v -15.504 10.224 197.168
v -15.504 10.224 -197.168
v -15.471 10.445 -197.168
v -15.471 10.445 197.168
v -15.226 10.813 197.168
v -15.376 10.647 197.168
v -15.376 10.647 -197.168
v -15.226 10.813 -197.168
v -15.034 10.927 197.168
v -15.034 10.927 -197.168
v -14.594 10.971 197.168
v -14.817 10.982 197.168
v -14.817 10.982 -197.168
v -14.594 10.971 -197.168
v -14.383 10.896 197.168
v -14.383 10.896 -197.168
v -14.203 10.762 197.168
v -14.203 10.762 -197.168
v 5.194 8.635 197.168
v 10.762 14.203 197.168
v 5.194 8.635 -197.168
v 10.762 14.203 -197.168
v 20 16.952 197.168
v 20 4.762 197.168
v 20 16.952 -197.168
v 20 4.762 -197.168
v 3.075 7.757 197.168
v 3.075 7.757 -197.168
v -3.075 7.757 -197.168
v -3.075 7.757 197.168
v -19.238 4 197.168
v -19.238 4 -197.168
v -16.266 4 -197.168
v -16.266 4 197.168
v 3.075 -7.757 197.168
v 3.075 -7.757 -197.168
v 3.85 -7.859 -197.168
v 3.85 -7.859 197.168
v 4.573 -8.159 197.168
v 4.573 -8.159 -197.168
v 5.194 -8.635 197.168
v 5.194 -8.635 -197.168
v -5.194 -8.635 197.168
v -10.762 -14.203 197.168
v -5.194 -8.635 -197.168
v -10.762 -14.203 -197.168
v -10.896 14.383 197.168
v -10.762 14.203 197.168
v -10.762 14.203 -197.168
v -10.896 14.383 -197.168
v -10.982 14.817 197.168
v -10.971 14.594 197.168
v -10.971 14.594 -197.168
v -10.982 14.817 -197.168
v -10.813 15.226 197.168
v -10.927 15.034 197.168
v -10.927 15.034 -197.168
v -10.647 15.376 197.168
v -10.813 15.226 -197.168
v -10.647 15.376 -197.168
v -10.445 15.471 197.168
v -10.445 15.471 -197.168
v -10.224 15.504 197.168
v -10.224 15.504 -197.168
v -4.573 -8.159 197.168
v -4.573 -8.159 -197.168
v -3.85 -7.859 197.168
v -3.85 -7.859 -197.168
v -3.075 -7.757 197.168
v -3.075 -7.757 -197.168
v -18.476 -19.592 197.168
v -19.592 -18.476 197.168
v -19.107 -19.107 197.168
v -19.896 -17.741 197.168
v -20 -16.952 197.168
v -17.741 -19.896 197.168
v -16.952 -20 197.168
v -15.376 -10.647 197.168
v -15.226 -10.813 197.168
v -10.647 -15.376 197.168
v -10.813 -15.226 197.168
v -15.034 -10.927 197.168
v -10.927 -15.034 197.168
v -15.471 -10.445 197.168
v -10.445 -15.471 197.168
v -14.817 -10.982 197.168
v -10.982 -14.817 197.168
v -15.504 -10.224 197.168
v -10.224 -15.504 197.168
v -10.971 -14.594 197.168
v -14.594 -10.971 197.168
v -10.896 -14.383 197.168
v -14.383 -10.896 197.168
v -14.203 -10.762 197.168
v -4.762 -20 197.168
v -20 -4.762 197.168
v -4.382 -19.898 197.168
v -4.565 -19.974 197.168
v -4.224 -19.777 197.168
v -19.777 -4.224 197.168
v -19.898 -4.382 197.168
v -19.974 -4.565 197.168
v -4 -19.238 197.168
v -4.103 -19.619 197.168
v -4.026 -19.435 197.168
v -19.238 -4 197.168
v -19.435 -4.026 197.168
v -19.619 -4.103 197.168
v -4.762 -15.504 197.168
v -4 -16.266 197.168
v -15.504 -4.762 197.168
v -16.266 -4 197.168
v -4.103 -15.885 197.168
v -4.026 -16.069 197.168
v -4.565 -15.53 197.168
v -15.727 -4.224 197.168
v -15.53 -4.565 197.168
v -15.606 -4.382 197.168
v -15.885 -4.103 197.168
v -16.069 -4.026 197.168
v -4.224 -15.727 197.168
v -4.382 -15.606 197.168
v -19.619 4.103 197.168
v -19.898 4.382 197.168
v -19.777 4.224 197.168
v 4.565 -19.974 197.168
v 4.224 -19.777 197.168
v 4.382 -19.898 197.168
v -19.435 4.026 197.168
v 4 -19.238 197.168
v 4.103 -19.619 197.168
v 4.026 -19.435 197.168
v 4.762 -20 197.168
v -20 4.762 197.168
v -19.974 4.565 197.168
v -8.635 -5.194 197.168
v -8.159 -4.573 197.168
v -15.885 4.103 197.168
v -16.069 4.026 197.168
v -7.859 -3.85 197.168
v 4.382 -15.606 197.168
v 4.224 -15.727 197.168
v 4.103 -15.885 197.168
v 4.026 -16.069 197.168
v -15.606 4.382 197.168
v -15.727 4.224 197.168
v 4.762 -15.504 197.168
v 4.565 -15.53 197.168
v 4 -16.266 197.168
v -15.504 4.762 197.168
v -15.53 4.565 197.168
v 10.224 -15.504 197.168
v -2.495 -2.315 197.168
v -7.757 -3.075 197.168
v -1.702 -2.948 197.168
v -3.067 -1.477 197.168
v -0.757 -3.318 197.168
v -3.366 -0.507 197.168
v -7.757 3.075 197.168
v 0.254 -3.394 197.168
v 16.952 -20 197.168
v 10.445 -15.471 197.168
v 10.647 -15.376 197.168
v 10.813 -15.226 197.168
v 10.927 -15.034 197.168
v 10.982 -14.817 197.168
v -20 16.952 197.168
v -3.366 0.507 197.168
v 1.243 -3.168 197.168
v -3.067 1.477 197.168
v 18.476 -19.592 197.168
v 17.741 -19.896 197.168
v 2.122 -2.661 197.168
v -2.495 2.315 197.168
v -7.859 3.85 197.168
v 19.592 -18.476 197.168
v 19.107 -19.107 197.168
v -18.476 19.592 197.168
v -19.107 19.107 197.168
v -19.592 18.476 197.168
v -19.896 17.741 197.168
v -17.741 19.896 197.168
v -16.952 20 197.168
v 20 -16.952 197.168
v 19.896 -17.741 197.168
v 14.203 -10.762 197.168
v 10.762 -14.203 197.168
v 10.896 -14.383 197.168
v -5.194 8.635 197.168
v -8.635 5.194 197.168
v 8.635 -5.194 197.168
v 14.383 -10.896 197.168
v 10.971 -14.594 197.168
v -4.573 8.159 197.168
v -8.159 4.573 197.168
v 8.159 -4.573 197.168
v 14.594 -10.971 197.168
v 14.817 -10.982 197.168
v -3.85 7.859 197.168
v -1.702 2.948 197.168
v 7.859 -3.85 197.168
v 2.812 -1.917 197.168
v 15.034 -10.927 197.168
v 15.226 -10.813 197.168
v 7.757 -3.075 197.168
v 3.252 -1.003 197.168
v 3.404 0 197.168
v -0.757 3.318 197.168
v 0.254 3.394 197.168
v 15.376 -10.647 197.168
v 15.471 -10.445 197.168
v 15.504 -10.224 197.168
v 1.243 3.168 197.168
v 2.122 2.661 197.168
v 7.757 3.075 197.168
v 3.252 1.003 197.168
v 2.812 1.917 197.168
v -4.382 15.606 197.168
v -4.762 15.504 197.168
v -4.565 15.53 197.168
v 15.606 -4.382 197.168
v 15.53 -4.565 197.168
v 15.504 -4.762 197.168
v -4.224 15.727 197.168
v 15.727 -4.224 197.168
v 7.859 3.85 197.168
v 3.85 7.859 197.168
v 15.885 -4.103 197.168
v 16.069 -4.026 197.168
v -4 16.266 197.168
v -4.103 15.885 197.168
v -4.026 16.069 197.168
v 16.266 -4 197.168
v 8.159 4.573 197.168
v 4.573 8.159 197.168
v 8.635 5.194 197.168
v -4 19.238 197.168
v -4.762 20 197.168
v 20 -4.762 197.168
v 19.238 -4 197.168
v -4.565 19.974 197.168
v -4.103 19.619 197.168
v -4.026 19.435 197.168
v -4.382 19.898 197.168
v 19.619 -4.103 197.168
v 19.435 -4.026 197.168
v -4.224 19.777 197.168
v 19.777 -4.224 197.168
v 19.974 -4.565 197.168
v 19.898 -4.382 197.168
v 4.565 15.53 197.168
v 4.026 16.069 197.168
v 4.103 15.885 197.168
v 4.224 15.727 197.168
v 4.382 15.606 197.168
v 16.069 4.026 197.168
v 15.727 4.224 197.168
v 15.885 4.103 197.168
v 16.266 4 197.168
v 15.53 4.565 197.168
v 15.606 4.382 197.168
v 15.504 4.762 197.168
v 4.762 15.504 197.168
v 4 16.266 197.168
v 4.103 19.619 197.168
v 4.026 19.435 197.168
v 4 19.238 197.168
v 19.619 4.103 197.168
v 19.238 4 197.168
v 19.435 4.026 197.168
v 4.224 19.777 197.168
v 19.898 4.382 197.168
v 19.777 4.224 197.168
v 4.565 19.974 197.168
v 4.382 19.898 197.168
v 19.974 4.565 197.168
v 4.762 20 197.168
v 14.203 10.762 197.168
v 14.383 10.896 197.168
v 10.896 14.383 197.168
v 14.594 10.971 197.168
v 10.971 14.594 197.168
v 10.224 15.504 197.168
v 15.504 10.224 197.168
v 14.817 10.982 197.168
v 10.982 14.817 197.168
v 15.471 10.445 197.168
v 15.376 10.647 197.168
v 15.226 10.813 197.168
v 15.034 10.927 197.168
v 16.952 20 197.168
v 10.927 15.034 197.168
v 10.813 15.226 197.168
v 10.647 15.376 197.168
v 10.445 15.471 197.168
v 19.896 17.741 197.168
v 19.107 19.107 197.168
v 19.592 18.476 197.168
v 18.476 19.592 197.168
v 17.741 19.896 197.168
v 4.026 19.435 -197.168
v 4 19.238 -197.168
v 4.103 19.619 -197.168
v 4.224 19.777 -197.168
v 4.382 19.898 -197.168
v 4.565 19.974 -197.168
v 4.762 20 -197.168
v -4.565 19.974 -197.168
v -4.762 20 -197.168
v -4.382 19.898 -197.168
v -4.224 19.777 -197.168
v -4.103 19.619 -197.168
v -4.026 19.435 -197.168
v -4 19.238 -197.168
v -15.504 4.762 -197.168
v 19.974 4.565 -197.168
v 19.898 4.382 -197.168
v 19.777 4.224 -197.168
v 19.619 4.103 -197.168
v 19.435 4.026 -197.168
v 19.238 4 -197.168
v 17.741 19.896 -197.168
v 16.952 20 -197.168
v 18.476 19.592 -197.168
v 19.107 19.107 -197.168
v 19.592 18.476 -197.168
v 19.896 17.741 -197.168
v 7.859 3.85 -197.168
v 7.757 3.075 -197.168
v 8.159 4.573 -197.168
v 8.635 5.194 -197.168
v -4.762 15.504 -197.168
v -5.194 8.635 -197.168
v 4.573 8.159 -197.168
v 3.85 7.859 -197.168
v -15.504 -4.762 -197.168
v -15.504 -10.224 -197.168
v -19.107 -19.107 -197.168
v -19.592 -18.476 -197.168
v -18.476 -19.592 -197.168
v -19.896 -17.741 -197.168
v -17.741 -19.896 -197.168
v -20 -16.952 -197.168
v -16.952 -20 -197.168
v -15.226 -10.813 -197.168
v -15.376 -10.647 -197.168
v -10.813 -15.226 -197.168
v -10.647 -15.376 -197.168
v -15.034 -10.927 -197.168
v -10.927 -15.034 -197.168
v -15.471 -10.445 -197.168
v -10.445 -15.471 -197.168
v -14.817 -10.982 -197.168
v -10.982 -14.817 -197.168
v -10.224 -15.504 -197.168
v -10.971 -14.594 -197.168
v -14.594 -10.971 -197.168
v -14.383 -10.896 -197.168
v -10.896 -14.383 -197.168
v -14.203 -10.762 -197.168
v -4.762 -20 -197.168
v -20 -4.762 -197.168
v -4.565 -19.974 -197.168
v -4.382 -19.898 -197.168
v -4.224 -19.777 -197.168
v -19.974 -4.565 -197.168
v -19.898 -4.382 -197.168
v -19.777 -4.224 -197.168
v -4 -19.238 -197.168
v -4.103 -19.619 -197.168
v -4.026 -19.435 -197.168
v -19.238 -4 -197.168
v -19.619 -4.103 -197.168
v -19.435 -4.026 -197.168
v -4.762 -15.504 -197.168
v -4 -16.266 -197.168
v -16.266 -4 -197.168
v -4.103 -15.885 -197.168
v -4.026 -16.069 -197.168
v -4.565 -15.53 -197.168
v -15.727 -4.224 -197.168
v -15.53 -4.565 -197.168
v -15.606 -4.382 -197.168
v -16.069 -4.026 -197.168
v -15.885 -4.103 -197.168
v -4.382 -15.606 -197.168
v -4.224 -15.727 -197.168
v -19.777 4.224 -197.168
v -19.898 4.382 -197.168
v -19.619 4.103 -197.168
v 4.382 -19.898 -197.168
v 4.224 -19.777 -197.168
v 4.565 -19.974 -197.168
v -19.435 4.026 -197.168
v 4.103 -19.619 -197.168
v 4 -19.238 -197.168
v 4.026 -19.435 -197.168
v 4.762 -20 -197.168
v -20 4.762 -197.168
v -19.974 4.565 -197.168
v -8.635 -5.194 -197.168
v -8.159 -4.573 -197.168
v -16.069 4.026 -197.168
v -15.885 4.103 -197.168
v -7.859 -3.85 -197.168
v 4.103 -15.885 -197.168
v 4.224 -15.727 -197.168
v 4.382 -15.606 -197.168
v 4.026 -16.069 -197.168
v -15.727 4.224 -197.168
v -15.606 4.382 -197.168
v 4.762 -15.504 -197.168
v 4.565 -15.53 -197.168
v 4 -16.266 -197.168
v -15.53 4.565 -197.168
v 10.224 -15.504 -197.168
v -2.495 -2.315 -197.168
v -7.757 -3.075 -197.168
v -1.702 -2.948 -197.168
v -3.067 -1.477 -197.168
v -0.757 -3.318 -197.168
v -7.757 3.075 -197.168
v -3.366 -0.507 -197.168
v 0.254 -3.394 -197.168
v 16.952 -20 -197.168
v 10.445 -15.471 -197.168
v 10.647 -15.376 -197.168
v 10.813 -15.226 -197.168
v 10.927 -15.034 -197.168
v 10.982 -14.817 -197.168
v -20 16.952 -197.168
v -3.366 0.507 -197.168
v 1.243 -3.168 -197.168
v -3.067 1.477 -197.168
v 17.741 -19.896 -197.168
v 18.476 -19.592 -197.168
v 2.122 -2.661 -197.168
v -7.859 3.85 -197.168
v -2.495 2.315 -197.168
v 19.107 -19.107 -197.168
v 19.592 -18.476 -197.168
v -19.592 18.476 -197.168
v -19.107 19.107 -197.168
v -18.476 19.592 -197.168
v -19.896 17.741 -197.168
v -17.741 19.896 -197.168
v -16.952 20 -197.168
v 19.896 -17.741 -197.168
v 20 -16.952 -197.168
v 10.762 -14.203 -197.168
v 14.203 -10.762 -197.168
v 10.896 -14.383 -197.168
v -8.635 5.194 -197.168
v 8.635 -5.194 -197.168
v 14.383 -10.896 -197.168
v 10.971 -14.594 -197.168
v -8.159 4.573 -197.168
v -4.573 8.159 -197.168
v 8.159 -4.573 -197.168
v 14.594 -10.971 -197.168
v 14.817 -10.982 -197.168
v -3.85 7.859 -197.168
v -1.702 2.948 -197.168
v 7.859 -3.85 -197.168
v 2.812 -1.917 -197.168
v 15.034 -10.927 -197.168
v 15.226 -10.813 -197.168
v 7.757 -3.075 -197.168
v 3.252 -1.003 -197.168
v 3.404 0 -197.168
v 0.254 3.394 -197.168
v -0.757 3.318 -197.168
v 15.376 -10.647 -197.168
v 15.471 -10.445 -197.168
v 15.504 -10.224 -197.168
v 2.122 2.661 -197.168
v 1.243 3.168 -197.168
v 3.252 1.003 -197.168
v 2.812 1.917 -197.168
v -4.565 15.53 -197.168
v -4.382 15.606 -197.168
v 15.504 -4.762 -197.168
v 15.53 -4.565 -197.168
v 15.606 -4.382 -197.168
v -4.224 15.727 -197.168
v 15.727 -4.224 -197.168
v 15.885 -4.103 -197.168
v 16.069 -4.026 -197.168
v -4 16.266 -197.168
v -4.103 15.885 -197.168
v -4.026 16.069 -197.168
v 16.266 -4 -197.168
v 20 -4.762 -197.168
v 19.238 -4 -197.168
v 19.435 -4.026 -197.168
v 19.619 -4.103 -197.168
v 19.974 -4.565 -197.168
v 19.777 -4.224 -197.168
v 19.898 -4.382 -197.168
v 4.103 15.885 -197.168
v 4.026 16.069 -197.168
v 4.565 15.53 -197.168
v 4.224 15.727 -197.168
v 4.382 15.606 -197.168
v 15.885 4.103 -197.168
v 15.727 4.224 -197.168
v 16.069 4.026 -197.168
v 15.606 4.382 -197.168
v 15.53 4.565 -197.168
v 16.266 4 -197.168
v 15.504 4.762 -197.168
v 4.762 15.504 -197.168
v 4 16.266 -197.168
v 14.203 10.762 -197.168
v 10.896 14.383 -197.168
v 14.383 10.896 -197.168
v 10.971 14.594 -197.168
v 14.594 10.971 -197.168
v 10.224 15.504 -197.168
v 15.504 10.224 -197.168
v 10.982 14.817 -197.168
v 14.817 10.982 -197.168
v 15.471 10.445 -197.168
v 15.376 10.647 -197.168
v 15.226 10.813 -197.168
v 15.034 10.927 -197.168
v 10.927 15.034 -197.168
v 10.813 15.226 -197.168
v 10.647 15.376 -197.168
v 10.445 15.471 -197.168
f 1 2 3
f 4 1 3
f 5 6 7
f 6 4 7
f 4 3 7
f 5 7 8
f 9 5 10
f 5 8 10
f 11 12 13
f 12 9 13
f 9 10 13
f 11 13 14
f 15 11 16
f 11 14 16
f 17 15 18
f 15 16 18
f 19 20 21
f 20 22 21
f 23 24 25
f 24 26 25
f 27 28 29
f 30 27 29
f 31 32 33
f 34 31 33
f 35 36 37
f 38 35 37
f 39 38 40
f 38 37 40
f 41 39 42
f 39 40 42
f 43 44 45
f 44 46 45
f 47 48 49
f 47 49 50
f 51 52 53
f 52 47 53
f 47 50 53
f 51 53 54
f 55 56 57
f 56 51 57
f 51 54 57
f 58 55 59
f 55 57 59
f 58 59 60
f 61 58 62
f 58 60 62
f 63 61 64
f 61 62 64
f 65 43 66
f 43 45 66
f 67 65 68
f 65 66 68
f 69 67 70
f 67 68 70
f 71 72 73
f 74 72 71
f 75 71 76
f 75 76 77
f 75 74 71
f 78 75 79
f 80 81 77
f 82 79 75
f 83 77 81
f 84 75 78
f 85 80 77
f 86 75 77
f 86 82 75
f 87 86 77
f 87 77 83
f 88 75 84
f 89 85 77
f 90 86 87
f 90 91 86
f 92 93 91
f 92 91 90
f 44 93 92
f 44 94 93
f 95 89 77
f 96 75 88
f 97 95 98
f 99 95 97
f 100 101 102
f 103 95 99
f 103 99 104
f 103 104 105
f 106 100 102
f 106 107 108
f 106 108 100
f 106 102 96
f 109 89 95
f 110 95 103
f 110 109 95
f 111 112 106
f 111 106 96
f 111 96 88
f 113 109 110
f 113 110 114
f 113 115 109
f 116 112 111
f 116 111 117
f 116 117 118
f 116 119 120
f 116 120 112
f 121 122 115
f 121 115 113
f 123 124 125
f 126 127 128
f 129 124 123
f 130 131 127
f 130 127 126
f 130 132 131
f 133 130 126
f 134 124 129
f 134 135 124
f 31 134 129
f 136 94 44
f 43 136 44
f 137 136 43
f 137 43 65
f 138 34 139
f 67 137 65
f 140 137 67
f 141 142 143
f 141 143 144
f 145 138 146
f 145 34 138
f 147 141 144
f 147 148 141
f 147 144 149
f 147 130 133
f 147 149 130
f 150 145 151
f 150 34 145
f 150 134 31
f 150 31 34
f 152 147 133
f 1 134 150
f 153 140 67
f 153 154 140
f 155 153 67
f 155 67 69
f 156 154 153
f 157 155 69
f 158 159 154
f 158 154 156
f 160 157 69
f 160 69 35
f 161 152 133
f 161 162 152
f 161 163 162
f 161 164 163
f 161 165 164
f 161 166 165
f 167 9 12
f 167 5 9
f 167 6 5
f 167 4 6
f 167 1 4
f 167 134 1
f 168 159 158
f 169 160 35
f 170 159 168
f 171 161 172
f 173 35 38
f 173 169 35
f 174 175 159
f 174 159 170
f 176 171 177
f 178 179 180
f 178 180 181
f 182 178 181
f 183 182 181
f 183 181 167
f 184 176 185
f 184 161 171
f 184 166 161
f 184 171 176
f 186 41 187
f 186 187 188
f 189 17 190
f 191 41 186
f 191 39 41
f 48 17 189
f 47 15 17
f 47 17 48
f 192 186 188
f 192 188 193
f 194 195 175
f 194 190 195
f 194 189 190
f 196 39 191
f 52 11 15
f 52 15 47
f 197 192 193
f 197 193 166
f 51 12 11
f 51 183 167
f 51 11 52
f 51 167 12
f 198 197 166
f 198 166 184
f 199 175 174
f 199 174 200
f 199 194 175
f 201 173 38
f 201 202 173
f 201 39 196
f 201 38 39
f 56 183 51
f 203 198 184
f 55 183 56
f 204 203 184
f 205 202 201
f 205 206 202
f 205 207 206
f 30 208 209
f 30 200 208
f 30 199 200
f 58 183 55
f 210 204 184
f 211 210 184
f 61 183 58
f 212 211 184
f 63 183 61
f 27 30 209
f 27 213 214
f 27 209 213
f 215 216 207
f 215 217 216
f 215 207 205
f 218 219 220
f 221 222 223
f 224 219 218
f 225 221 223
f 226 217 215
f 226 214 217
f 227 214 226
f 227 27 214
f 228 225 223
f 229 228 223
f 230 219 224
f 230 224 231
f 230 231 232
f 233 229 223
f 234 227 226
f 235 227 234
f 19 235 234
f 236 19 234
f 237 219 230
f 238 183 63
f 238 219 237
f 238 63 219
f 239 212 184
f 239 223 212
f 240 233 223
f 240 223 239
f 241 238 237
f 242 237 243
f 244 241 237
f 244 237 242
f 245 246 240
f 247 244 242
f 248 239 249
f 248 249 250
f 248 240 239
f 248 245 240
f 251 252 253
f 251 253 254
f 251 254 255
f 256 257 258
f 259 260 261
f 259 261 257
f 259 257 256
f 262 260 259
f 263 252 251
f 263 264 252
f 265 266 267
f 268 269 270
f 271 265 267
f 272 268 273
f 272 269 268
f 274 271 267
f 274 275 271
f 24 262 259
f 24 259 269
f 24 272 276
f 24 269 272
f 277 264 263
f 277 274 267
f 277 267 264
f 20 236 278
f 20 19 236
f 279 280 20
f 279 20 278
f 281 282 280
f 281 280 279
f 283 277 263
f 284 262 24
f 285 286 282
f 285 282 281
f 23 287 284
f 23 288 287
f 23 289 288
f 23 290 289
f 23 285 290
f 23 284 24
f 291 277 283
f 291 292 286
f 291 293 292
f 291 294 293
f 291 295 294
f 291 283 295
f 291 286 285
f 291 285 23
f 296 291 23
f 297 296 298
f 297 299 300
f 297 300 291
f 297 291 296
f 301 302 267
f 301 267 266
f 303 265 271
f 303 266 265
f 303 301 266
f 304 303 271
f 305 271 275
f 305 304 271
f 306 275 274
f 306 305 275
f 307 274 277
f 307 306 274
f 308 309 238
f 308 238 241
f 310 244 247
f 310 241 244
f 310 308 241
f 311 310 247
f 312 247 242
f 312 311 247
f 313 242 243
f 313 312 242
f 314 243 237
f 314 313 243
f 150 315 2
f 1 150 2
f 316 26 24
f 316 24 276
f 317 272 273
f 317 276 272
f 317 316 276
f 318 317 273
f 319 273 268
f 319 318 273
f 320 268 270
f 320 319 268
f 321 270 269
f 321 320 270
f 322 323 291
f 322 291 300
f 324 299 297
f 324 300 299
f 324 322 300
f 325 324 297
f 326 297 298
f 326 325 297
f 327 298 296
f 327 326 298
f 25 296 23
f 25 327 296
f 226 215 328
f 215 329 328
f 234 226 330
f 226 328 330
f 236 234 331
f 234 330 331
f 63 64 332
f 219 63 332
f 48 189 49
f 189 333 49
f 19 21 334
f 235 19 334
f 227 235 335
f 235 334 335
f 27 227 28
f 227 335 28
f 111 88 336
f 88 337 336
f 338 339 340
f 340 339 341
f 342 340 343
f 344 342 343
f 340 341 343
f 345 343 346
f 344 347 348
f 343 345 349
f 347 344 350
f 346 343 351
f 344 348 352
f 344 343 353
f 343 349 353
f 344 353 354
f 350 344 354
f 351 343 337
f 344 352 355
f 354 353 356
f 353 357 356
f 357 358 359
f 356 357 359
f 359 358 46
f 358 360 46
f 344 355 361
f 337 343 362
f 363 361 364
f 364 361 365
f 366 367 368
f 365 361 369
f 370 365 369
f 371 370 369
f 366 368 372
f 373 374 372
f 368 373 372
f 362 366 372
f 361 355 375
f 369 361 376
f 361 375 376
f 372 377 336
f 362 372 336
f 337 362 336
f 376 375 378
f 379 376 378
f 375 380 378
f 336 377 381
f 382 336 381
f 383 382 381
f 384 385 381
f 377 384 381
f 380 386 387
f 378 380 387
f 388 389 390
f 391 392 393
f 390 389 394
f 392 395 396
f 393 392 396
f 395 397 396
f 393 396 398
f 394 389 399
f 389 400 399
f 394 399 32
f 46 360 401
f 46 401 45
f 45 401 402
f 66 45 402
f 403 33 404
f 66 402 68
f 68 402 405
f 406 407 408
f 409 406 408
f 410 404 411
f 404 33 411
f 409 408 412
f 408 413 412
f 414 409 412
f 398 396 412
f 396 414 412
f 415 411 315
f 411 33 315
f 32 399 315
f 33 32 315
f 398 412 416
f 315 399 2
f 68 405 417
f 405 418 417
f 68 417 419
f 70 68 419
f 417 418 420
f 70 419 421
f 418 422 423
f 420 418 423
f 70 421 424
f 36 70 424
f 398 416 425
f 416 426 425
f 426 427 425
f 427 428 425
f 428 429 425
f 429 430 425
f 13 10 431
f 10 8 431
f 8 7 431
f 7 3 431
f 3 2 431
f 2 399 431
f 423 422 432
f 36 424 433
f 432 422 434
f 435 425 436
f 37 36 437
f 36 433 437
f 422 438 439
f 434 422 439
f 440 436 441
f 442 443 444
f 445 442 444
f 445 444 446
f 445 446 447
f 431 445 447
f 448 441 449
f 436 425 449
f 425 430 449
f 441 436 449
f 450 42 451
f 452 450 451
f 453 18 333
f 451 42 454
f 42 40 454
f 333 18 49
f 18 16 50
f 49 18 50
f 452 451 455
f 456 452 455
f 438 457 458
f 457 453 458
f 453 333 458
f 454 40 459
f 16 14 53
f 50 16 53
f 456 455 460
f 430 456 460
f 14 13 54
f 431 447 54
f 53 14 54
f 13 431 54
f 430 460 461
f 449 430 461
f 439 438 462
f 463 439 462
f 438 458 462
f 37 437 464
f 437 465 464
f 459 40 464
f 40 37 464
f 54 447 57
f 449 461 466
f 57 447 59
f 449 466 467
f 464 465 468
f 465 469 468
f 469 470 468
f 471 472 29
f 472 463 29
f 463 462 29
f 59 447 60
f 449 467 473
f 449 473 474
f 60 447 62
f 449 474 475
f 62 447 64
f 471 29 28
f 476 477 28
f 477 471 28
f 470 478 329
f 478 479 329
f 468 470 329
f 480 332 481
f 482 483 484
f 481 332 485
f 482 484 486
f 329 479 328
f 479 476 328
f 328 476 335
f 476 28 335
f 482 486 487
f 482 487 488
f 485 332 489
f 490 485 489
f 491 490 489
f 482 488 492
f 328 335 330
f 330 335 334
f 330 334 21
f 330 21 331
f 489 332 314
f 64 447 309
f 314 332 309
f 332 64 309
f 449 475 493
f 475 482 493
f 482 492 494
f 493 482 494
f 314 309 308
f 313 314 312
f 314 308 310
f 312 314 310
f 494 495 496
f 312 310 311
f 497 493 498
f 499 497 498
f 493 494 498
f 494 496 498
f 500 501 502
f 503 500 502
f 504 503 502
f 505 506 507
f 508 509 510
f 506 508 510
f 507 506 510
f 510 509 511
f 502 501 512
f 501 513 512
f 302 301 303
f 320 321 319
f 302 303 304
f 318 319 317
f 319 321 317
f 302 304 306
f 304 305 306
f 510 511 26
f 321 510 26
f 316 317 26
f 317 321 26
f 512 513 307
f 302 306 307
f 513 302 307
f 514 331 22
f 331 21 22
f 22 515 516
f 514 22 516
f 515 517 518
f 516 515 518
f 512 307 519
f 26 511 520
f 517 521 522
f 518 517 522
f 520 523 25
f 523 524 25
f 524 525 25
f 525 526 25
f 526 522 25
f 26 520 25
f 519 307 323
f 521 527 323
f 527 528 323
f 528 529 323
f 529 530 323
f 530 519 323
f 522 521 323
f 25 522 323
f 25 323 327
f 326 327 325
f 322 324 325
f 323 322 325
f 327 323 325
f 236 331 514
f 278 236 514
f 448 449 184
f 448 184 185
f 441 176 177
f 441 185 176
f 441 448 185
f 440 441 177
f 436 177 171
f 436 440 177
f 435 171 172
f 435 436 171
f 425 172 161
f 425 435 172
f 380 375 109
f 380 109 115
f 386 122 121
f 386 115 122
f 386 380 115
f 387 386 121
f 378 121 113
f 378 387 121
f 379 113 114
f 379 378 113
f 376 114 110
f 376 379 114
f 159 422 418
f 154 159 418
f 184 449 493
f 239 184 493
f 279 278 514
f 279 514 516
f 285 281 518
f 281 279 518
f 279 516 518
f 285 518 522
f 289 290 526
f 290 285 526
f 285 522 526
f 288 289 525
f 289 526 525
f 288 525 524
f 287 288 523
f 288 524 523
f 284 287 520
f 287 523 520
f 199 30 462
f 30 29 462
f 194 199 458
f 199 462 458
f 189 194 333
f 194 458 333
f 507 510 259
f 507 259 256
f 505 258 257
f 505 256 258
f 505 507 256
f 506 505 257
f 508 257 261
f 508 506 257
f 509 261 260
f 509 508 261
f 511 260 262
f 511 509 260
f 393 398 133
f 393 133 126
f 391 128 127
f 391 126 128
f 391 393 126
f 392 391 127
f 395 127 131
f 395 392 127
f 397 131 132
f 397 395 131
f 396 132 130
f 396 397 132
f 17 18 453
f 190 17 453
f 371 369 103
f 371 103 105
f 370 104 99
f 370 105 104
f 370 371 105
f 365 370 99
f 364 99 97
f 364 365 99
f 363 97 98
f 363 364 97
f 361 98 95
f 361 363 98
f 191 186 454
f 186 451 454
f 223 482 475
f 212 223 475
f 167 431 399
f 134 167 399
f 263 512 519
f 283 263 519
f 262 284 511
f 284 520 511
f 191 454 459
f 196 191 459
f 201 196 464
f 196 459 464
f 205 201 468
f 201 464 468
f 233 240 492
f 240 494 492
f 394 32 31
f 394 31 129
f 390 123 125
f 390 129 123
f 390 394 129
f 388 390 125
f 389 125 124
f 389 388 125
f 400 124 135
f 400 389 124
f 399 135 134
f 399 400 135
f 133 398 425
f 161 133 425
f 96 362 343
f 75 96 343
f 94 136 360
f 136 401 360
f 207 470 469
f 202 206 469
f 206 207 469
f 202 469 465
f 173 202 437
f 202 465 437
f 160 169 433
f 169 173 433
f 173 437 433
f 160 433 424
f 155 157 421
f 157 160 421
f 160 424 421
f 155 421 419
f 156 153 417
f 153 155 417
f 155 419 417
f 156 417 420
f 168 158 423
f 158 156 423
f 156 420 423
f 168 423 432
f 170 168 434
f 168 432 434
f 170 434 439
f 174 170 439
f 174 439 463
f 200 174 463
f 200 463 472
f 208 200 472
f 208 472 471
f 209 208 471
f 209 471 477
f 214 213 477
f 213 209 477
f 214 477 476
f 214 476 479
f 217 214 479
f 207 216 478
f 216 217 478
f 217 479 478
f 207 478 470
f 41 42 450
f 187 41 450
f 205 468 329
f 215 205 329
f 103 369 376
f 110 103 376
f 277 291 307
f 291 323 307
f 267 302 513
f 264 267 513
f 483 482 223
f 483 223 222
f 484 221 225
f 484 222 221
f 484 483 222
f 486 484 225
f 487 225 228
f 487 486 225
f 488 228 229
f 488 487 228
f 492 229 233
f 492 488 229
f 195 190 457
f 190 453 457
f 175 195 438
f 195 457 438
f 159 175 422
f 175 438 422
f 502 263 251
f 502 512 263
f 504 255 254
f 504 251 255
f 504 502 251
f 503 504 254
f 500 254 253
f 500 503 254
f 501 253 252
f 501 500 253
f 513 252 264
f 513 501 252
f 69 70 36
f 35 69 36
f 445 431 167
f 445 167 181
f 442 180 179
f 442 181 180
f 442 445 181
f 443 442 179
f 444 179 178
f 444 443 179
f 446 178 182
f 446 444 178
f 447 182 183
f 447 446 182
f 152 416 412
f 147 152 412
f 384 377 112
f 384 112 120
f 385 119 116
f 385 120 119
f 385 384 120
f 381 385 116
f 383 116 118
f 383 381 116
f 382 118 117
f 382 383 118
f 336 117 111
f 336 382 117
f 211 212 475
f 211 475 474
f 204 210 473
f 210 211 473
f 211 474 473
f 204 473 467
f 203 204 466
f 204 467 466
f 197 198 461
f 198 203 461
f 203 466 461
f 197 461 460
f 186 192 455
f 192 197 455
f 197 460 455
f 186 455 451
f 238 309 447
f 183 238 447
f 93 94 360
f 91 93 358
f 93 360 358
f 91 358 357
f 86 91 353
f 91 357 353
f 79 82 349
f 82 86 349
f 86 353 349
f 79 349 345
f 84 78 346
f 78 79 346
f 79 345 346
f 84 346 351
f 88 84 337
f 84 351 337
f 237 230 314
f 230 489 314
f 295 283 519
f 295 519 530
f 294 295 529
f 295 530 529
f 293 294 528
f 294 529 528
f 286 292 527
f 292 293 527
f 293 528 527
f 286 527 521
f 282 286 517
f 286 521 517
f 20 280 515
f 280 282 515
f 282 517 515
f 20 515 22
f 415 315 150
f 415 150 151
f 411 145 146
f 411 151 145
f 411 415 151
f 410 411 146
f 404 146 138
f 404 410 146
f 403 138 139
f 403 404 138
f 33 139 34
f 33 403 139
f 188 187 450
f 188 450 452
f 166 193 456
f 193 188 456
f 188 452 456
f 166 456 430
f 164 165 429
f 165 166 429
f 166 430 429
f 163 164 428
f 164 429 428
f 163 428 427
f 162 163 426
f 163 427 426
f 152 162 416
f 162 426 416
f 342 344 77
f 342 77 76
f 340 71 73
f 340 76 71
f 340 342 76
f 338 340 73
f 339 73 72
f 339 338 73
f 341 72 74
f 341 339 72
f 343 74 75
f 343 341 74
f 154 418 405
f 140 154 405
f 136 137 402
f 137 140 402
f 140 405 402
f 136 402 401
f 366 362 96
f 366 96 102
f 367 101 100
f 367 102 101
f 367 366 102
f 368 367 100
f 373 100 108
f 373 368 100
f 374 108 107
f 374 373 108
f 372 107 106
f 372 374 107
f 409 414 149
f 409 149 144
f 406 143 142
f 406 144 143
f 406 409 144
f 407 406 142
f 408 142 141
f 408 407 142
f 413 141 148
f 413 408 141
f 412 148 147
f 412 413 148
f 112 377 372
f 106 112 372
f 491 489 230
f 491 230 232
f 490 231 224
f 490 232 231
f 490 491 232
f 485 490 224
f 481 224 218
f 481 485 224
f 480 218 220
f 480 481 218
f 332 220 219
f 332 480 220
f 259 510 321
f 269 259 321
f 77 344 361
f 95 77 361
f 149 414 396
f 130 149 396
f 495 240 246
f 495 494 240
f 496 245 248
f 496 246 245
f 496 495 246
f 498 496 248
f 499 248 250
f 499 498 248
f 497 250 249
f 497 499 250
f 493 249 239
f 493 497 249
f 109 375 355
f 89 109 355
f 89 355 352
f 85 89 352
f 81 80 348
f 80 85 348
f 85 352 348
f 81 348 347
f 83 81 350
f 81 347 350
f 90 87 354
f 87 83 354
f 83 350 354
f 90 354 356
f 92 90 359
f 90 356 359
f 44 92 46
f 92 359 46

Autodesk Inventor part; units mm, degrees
ref_plane "YZ Plane" through (0, 0, 0) normal (1, 0, 0) x (0, 1, 0)
ref_plane "XZ Plane" through (0, 0, 0) normal (0, 1, 0) x (-1, 0, 0)
ref_plane "XY Plane" through (0, 0, 0) normal (0, 0, 1) x (1, 0, 0)
sketch "Sketch1" plane through (-16.952, 20, 0) normal (0, 0, 1) x (1, 0, 0)
  arc A0 (11.758, -11.3649) -> (13.8774, -12.2428) centre (13.8774, -9.2456) ccw projected
  line L0 (11.758, -11.3649) -> (6.1897, -5.7966) projected
  arc A1 (6.7285, -4.4958) -> (6.1897, -5.7966) centre (6.7285, -5.2578) ccw projected
  line L1 (6.7285, -4.4958) -> (12.1895, -4.4958) projected
  arc A2 (12.1895, -4.4958) -> (12.9515, -3.7338) centre (12.1895, -3.7338) ccw projected
  line L2 (12.9515, -3.7338) -> (12.9515, -0.762) projected
  arc A3 (12.9515, -0.762) -> (12.1895, 0) centre (12.1895, -0.762) ccw projected
  line L3 (12.1895, 0) -> (0, 0) projected
  arc A4 (0, 0) -> (-3.048, -3.048) centre (0, -3.048) ccw projected
  line L4 (-3.048, -3.048) -> (-3.048, -15.2375) projected
  arc A5 (-3.048, -15.2375) -> (-2.286, -15.9995) centre (-2.286, -15.2375) ccw projected
  line L5 (-2.286, -15.9995) -> (0.6858, -15.9995) projected
  arc A6 (0.6858, -15.9995) -> (1.4478, -15.2375) centre (0.6858, -15.2375) ccw projected
  line L6 (1.4478, -15.2375) -> (1.4478, -9.7765) projected
  arc A7 (2.7486, -9.2377) -> (1.4478, -9.7765) centre (2.2098, -9.7765) ccw projected
  line L7 (2.7486, -9.2377) -> (8.3169, -14.806) projected
  arc A8 (9.1948, -16.9254) -> (8.3169, -14.806) centre (6.1976, -16.9254) ccw projected
  line L8 (9.1948, -16.9254) -> (9.1948, -23.0746) projected
  arc A9 (8.3169, -25.194) -> (9.1948, -23.0746) centre (6.1976, -23.0746) ccw projected
  line L9 (8.3169, -25.194) -> (2.7486, -30.7623) projected
  arc A10 (1.4478, -30.2235) -> (2.7486, -30.7623) centre (2.2098, -30.2235) ccw projected
  line L10 (1.4478, -30.2235) -> (1.4478, -24.7625) projected
  arc A11 (1.4478, -24.7625) -> (0.6858, -24.0005) centre (0.6858, -24.7625) ccw projected
  line L11 (0.6858, -24.0005) -> (-2.286, -24.0005) projected
  arc A12 (-2.286, -24.0005) -> (-3.048, -24.7625) centre (-2.286, -24.7625) ccw projected
  line L12 (-3.048, -24.7625) -> (-3.048, -36.952) projected
  arc A13 (-3.048, -36.952) -> (0, -40) centre (0, -36.952) ccw projected
  line L13 (0, -40) -> (12.1895, -40) projected
  arc A14 (12.1895, -40) -> (12.9515, -39.238) centre (12.1895, -39.238) ccw projected
  line L14 (12.9515, -39.238) -> (12.9515, -36.2662) projected
  arc A15 (12.9515, -36.2662) -> (12.1895, -35.5042) centre (12.1895, -36.2662) ccw projected
  line L15 (12.1895, -35.5042) -> (6.7285, -35.5042) projected
  arc A16 (6.1897, -34.2034) -> (6.7285, -35.5042) centre (6.7285, -34.7422) ccw projected
  line L16 (6.1897, -34.2034) -> (11.758, -28.6351) projected
  arc A17 (13.8774, -27.7572) -> (11.758, -28.6351) centre (13.8774, -30.7544) ccw projected
  line L17 (13.8774, -27.7572) -> (20.0266, -27.7572) projected
  arc A18 (22.146, -28.6351) -> (20.0266, -27.7572) centre (20.0266, -30.7544) ccw projected
  line L18 (22.146, -28.6351) -> (27.7143, -34.2034) projected
  arc A19 (27.1755, -35.5042) -> (27.7143, -34.2034) centre (27.1755, -34.7422) ccw projected
  line L19 (27.1755, -35.5042) -> (21.7145, -35.5042) projected
  arc A20 (21.7145, -35.5042) -> (20.9525, -36.2662) centre (21.7145, -36.2662) ccw projected
  line L20 (20.9525, -36.2662) -> (20.9525, -39.238) projected
  arc A21 (20.9525, -39.238) -> (21.7145, -40) centre (21.7145, -39.238) ccw projected
  line L21 (21.7145, -40) -> (33.904, -40) projected
  arc A22 (33.904, -40) -> (36.952, -36.952) centre (33.904, -36.952) ccw projected
  line L22 (36.952, -36.952) -> (36.952, -24.7625) projected
  arc A23 (36.952, -24.7625) -> (36.19, -24.0005) centre (36.19, -24.7625) ccw projected
  line L23 (36.19, -24.0005) -> (33.2182, -24.0005) projected
  arc A24 (33.2182, -24.0005) -> (32.4562, -24.7625) centre (33.2182, -24.7625) ccw projected
  line L24 (32.4562, -24.7625) -> (32.4562, -30.2235) projected
  arc A25 (31.1554, -30.7623) -> (32.4562, -30.2235) centre (31.6942, -30.2235) ccw projected
  line L25 (31.1554, -30.7623) -> (25.5871, -25.194) projected
  arc A26 (24.7092, -23.0746) -> (25.5871, -25.194) centre (27.7064, -23.0746) ccw projected
  line L26 (24.7092, -23.0746) -> (24.7092, -16.9254) projected
  arc A27 (25.5871, -14.806) -> (24.7092, -16.9254) centre (27.7064, -16.9254) ccw projected
  line L27 (25.5871, -14.806) -> (31.1554, -9.2377) projected
  arc A28 (32.4562, -9.7765) -> (31.1554, -9.2377) centre (31.6942, -9.7765) ccw projected
  line L28 (32.4562, -9.7765) -> (32.4562, -15.2375) projected
  arc A29 (32.4562, -15.2375) -> (33.2182, -15.9995) centre (33.2182, -15.2375) ccw projected
  line L29 (33.2182, -15.9995) -> (36.19, -15.9995) projected
  arc A30 (36.19, -15.9995) -> (36.952, -15.2375) centre (36.19, -15.2375) ccw projected
  line L30 (36.952, -15.2375) -> (36.952, -3.048) projected
  arc A31 (36.952, -3.048) -> (33.904, 0) centre (33.904, -3.048) ccw projected
  line L31 (33.904, 0) -> (21.7145, 0) projected
  arc A32 (21.7145, 0) -> (20.9525, -0.762) centre (21.7145, -0.762) ccw projected
  line L32 (20.9525, -0.762) -> (20.9525, -3.7338) projected
  arc A33 (20.9525, -3.7338) -> (21.7145, -4.4958) centre (21.7145, -3.7338) ccw projected
  line L33 (21.7145, -4.4958) -> (27.1755, -4.4958) projected
  arc A34 (27.7143, -5.7966) -> (27.1755, -4.4958) centre (27.1755, -5.2578) ccw projected
  line L34 (27.7143, -5.7966) -> (22.146, -11.3649) projected
  arc A35 (20.0266, -12.2428) -> (22.146, -11.3649) centre (20.0266, -9.2456) ccw projected
  line L35 (20.0266, -12.2428) -> (13.8774, -12.2428) projected
  circle A36 centre (16.952, -20) radius 3.4036 projected
extrude "Extrusion1" add sketch "Sketch1" along normal mid plane 394.335
